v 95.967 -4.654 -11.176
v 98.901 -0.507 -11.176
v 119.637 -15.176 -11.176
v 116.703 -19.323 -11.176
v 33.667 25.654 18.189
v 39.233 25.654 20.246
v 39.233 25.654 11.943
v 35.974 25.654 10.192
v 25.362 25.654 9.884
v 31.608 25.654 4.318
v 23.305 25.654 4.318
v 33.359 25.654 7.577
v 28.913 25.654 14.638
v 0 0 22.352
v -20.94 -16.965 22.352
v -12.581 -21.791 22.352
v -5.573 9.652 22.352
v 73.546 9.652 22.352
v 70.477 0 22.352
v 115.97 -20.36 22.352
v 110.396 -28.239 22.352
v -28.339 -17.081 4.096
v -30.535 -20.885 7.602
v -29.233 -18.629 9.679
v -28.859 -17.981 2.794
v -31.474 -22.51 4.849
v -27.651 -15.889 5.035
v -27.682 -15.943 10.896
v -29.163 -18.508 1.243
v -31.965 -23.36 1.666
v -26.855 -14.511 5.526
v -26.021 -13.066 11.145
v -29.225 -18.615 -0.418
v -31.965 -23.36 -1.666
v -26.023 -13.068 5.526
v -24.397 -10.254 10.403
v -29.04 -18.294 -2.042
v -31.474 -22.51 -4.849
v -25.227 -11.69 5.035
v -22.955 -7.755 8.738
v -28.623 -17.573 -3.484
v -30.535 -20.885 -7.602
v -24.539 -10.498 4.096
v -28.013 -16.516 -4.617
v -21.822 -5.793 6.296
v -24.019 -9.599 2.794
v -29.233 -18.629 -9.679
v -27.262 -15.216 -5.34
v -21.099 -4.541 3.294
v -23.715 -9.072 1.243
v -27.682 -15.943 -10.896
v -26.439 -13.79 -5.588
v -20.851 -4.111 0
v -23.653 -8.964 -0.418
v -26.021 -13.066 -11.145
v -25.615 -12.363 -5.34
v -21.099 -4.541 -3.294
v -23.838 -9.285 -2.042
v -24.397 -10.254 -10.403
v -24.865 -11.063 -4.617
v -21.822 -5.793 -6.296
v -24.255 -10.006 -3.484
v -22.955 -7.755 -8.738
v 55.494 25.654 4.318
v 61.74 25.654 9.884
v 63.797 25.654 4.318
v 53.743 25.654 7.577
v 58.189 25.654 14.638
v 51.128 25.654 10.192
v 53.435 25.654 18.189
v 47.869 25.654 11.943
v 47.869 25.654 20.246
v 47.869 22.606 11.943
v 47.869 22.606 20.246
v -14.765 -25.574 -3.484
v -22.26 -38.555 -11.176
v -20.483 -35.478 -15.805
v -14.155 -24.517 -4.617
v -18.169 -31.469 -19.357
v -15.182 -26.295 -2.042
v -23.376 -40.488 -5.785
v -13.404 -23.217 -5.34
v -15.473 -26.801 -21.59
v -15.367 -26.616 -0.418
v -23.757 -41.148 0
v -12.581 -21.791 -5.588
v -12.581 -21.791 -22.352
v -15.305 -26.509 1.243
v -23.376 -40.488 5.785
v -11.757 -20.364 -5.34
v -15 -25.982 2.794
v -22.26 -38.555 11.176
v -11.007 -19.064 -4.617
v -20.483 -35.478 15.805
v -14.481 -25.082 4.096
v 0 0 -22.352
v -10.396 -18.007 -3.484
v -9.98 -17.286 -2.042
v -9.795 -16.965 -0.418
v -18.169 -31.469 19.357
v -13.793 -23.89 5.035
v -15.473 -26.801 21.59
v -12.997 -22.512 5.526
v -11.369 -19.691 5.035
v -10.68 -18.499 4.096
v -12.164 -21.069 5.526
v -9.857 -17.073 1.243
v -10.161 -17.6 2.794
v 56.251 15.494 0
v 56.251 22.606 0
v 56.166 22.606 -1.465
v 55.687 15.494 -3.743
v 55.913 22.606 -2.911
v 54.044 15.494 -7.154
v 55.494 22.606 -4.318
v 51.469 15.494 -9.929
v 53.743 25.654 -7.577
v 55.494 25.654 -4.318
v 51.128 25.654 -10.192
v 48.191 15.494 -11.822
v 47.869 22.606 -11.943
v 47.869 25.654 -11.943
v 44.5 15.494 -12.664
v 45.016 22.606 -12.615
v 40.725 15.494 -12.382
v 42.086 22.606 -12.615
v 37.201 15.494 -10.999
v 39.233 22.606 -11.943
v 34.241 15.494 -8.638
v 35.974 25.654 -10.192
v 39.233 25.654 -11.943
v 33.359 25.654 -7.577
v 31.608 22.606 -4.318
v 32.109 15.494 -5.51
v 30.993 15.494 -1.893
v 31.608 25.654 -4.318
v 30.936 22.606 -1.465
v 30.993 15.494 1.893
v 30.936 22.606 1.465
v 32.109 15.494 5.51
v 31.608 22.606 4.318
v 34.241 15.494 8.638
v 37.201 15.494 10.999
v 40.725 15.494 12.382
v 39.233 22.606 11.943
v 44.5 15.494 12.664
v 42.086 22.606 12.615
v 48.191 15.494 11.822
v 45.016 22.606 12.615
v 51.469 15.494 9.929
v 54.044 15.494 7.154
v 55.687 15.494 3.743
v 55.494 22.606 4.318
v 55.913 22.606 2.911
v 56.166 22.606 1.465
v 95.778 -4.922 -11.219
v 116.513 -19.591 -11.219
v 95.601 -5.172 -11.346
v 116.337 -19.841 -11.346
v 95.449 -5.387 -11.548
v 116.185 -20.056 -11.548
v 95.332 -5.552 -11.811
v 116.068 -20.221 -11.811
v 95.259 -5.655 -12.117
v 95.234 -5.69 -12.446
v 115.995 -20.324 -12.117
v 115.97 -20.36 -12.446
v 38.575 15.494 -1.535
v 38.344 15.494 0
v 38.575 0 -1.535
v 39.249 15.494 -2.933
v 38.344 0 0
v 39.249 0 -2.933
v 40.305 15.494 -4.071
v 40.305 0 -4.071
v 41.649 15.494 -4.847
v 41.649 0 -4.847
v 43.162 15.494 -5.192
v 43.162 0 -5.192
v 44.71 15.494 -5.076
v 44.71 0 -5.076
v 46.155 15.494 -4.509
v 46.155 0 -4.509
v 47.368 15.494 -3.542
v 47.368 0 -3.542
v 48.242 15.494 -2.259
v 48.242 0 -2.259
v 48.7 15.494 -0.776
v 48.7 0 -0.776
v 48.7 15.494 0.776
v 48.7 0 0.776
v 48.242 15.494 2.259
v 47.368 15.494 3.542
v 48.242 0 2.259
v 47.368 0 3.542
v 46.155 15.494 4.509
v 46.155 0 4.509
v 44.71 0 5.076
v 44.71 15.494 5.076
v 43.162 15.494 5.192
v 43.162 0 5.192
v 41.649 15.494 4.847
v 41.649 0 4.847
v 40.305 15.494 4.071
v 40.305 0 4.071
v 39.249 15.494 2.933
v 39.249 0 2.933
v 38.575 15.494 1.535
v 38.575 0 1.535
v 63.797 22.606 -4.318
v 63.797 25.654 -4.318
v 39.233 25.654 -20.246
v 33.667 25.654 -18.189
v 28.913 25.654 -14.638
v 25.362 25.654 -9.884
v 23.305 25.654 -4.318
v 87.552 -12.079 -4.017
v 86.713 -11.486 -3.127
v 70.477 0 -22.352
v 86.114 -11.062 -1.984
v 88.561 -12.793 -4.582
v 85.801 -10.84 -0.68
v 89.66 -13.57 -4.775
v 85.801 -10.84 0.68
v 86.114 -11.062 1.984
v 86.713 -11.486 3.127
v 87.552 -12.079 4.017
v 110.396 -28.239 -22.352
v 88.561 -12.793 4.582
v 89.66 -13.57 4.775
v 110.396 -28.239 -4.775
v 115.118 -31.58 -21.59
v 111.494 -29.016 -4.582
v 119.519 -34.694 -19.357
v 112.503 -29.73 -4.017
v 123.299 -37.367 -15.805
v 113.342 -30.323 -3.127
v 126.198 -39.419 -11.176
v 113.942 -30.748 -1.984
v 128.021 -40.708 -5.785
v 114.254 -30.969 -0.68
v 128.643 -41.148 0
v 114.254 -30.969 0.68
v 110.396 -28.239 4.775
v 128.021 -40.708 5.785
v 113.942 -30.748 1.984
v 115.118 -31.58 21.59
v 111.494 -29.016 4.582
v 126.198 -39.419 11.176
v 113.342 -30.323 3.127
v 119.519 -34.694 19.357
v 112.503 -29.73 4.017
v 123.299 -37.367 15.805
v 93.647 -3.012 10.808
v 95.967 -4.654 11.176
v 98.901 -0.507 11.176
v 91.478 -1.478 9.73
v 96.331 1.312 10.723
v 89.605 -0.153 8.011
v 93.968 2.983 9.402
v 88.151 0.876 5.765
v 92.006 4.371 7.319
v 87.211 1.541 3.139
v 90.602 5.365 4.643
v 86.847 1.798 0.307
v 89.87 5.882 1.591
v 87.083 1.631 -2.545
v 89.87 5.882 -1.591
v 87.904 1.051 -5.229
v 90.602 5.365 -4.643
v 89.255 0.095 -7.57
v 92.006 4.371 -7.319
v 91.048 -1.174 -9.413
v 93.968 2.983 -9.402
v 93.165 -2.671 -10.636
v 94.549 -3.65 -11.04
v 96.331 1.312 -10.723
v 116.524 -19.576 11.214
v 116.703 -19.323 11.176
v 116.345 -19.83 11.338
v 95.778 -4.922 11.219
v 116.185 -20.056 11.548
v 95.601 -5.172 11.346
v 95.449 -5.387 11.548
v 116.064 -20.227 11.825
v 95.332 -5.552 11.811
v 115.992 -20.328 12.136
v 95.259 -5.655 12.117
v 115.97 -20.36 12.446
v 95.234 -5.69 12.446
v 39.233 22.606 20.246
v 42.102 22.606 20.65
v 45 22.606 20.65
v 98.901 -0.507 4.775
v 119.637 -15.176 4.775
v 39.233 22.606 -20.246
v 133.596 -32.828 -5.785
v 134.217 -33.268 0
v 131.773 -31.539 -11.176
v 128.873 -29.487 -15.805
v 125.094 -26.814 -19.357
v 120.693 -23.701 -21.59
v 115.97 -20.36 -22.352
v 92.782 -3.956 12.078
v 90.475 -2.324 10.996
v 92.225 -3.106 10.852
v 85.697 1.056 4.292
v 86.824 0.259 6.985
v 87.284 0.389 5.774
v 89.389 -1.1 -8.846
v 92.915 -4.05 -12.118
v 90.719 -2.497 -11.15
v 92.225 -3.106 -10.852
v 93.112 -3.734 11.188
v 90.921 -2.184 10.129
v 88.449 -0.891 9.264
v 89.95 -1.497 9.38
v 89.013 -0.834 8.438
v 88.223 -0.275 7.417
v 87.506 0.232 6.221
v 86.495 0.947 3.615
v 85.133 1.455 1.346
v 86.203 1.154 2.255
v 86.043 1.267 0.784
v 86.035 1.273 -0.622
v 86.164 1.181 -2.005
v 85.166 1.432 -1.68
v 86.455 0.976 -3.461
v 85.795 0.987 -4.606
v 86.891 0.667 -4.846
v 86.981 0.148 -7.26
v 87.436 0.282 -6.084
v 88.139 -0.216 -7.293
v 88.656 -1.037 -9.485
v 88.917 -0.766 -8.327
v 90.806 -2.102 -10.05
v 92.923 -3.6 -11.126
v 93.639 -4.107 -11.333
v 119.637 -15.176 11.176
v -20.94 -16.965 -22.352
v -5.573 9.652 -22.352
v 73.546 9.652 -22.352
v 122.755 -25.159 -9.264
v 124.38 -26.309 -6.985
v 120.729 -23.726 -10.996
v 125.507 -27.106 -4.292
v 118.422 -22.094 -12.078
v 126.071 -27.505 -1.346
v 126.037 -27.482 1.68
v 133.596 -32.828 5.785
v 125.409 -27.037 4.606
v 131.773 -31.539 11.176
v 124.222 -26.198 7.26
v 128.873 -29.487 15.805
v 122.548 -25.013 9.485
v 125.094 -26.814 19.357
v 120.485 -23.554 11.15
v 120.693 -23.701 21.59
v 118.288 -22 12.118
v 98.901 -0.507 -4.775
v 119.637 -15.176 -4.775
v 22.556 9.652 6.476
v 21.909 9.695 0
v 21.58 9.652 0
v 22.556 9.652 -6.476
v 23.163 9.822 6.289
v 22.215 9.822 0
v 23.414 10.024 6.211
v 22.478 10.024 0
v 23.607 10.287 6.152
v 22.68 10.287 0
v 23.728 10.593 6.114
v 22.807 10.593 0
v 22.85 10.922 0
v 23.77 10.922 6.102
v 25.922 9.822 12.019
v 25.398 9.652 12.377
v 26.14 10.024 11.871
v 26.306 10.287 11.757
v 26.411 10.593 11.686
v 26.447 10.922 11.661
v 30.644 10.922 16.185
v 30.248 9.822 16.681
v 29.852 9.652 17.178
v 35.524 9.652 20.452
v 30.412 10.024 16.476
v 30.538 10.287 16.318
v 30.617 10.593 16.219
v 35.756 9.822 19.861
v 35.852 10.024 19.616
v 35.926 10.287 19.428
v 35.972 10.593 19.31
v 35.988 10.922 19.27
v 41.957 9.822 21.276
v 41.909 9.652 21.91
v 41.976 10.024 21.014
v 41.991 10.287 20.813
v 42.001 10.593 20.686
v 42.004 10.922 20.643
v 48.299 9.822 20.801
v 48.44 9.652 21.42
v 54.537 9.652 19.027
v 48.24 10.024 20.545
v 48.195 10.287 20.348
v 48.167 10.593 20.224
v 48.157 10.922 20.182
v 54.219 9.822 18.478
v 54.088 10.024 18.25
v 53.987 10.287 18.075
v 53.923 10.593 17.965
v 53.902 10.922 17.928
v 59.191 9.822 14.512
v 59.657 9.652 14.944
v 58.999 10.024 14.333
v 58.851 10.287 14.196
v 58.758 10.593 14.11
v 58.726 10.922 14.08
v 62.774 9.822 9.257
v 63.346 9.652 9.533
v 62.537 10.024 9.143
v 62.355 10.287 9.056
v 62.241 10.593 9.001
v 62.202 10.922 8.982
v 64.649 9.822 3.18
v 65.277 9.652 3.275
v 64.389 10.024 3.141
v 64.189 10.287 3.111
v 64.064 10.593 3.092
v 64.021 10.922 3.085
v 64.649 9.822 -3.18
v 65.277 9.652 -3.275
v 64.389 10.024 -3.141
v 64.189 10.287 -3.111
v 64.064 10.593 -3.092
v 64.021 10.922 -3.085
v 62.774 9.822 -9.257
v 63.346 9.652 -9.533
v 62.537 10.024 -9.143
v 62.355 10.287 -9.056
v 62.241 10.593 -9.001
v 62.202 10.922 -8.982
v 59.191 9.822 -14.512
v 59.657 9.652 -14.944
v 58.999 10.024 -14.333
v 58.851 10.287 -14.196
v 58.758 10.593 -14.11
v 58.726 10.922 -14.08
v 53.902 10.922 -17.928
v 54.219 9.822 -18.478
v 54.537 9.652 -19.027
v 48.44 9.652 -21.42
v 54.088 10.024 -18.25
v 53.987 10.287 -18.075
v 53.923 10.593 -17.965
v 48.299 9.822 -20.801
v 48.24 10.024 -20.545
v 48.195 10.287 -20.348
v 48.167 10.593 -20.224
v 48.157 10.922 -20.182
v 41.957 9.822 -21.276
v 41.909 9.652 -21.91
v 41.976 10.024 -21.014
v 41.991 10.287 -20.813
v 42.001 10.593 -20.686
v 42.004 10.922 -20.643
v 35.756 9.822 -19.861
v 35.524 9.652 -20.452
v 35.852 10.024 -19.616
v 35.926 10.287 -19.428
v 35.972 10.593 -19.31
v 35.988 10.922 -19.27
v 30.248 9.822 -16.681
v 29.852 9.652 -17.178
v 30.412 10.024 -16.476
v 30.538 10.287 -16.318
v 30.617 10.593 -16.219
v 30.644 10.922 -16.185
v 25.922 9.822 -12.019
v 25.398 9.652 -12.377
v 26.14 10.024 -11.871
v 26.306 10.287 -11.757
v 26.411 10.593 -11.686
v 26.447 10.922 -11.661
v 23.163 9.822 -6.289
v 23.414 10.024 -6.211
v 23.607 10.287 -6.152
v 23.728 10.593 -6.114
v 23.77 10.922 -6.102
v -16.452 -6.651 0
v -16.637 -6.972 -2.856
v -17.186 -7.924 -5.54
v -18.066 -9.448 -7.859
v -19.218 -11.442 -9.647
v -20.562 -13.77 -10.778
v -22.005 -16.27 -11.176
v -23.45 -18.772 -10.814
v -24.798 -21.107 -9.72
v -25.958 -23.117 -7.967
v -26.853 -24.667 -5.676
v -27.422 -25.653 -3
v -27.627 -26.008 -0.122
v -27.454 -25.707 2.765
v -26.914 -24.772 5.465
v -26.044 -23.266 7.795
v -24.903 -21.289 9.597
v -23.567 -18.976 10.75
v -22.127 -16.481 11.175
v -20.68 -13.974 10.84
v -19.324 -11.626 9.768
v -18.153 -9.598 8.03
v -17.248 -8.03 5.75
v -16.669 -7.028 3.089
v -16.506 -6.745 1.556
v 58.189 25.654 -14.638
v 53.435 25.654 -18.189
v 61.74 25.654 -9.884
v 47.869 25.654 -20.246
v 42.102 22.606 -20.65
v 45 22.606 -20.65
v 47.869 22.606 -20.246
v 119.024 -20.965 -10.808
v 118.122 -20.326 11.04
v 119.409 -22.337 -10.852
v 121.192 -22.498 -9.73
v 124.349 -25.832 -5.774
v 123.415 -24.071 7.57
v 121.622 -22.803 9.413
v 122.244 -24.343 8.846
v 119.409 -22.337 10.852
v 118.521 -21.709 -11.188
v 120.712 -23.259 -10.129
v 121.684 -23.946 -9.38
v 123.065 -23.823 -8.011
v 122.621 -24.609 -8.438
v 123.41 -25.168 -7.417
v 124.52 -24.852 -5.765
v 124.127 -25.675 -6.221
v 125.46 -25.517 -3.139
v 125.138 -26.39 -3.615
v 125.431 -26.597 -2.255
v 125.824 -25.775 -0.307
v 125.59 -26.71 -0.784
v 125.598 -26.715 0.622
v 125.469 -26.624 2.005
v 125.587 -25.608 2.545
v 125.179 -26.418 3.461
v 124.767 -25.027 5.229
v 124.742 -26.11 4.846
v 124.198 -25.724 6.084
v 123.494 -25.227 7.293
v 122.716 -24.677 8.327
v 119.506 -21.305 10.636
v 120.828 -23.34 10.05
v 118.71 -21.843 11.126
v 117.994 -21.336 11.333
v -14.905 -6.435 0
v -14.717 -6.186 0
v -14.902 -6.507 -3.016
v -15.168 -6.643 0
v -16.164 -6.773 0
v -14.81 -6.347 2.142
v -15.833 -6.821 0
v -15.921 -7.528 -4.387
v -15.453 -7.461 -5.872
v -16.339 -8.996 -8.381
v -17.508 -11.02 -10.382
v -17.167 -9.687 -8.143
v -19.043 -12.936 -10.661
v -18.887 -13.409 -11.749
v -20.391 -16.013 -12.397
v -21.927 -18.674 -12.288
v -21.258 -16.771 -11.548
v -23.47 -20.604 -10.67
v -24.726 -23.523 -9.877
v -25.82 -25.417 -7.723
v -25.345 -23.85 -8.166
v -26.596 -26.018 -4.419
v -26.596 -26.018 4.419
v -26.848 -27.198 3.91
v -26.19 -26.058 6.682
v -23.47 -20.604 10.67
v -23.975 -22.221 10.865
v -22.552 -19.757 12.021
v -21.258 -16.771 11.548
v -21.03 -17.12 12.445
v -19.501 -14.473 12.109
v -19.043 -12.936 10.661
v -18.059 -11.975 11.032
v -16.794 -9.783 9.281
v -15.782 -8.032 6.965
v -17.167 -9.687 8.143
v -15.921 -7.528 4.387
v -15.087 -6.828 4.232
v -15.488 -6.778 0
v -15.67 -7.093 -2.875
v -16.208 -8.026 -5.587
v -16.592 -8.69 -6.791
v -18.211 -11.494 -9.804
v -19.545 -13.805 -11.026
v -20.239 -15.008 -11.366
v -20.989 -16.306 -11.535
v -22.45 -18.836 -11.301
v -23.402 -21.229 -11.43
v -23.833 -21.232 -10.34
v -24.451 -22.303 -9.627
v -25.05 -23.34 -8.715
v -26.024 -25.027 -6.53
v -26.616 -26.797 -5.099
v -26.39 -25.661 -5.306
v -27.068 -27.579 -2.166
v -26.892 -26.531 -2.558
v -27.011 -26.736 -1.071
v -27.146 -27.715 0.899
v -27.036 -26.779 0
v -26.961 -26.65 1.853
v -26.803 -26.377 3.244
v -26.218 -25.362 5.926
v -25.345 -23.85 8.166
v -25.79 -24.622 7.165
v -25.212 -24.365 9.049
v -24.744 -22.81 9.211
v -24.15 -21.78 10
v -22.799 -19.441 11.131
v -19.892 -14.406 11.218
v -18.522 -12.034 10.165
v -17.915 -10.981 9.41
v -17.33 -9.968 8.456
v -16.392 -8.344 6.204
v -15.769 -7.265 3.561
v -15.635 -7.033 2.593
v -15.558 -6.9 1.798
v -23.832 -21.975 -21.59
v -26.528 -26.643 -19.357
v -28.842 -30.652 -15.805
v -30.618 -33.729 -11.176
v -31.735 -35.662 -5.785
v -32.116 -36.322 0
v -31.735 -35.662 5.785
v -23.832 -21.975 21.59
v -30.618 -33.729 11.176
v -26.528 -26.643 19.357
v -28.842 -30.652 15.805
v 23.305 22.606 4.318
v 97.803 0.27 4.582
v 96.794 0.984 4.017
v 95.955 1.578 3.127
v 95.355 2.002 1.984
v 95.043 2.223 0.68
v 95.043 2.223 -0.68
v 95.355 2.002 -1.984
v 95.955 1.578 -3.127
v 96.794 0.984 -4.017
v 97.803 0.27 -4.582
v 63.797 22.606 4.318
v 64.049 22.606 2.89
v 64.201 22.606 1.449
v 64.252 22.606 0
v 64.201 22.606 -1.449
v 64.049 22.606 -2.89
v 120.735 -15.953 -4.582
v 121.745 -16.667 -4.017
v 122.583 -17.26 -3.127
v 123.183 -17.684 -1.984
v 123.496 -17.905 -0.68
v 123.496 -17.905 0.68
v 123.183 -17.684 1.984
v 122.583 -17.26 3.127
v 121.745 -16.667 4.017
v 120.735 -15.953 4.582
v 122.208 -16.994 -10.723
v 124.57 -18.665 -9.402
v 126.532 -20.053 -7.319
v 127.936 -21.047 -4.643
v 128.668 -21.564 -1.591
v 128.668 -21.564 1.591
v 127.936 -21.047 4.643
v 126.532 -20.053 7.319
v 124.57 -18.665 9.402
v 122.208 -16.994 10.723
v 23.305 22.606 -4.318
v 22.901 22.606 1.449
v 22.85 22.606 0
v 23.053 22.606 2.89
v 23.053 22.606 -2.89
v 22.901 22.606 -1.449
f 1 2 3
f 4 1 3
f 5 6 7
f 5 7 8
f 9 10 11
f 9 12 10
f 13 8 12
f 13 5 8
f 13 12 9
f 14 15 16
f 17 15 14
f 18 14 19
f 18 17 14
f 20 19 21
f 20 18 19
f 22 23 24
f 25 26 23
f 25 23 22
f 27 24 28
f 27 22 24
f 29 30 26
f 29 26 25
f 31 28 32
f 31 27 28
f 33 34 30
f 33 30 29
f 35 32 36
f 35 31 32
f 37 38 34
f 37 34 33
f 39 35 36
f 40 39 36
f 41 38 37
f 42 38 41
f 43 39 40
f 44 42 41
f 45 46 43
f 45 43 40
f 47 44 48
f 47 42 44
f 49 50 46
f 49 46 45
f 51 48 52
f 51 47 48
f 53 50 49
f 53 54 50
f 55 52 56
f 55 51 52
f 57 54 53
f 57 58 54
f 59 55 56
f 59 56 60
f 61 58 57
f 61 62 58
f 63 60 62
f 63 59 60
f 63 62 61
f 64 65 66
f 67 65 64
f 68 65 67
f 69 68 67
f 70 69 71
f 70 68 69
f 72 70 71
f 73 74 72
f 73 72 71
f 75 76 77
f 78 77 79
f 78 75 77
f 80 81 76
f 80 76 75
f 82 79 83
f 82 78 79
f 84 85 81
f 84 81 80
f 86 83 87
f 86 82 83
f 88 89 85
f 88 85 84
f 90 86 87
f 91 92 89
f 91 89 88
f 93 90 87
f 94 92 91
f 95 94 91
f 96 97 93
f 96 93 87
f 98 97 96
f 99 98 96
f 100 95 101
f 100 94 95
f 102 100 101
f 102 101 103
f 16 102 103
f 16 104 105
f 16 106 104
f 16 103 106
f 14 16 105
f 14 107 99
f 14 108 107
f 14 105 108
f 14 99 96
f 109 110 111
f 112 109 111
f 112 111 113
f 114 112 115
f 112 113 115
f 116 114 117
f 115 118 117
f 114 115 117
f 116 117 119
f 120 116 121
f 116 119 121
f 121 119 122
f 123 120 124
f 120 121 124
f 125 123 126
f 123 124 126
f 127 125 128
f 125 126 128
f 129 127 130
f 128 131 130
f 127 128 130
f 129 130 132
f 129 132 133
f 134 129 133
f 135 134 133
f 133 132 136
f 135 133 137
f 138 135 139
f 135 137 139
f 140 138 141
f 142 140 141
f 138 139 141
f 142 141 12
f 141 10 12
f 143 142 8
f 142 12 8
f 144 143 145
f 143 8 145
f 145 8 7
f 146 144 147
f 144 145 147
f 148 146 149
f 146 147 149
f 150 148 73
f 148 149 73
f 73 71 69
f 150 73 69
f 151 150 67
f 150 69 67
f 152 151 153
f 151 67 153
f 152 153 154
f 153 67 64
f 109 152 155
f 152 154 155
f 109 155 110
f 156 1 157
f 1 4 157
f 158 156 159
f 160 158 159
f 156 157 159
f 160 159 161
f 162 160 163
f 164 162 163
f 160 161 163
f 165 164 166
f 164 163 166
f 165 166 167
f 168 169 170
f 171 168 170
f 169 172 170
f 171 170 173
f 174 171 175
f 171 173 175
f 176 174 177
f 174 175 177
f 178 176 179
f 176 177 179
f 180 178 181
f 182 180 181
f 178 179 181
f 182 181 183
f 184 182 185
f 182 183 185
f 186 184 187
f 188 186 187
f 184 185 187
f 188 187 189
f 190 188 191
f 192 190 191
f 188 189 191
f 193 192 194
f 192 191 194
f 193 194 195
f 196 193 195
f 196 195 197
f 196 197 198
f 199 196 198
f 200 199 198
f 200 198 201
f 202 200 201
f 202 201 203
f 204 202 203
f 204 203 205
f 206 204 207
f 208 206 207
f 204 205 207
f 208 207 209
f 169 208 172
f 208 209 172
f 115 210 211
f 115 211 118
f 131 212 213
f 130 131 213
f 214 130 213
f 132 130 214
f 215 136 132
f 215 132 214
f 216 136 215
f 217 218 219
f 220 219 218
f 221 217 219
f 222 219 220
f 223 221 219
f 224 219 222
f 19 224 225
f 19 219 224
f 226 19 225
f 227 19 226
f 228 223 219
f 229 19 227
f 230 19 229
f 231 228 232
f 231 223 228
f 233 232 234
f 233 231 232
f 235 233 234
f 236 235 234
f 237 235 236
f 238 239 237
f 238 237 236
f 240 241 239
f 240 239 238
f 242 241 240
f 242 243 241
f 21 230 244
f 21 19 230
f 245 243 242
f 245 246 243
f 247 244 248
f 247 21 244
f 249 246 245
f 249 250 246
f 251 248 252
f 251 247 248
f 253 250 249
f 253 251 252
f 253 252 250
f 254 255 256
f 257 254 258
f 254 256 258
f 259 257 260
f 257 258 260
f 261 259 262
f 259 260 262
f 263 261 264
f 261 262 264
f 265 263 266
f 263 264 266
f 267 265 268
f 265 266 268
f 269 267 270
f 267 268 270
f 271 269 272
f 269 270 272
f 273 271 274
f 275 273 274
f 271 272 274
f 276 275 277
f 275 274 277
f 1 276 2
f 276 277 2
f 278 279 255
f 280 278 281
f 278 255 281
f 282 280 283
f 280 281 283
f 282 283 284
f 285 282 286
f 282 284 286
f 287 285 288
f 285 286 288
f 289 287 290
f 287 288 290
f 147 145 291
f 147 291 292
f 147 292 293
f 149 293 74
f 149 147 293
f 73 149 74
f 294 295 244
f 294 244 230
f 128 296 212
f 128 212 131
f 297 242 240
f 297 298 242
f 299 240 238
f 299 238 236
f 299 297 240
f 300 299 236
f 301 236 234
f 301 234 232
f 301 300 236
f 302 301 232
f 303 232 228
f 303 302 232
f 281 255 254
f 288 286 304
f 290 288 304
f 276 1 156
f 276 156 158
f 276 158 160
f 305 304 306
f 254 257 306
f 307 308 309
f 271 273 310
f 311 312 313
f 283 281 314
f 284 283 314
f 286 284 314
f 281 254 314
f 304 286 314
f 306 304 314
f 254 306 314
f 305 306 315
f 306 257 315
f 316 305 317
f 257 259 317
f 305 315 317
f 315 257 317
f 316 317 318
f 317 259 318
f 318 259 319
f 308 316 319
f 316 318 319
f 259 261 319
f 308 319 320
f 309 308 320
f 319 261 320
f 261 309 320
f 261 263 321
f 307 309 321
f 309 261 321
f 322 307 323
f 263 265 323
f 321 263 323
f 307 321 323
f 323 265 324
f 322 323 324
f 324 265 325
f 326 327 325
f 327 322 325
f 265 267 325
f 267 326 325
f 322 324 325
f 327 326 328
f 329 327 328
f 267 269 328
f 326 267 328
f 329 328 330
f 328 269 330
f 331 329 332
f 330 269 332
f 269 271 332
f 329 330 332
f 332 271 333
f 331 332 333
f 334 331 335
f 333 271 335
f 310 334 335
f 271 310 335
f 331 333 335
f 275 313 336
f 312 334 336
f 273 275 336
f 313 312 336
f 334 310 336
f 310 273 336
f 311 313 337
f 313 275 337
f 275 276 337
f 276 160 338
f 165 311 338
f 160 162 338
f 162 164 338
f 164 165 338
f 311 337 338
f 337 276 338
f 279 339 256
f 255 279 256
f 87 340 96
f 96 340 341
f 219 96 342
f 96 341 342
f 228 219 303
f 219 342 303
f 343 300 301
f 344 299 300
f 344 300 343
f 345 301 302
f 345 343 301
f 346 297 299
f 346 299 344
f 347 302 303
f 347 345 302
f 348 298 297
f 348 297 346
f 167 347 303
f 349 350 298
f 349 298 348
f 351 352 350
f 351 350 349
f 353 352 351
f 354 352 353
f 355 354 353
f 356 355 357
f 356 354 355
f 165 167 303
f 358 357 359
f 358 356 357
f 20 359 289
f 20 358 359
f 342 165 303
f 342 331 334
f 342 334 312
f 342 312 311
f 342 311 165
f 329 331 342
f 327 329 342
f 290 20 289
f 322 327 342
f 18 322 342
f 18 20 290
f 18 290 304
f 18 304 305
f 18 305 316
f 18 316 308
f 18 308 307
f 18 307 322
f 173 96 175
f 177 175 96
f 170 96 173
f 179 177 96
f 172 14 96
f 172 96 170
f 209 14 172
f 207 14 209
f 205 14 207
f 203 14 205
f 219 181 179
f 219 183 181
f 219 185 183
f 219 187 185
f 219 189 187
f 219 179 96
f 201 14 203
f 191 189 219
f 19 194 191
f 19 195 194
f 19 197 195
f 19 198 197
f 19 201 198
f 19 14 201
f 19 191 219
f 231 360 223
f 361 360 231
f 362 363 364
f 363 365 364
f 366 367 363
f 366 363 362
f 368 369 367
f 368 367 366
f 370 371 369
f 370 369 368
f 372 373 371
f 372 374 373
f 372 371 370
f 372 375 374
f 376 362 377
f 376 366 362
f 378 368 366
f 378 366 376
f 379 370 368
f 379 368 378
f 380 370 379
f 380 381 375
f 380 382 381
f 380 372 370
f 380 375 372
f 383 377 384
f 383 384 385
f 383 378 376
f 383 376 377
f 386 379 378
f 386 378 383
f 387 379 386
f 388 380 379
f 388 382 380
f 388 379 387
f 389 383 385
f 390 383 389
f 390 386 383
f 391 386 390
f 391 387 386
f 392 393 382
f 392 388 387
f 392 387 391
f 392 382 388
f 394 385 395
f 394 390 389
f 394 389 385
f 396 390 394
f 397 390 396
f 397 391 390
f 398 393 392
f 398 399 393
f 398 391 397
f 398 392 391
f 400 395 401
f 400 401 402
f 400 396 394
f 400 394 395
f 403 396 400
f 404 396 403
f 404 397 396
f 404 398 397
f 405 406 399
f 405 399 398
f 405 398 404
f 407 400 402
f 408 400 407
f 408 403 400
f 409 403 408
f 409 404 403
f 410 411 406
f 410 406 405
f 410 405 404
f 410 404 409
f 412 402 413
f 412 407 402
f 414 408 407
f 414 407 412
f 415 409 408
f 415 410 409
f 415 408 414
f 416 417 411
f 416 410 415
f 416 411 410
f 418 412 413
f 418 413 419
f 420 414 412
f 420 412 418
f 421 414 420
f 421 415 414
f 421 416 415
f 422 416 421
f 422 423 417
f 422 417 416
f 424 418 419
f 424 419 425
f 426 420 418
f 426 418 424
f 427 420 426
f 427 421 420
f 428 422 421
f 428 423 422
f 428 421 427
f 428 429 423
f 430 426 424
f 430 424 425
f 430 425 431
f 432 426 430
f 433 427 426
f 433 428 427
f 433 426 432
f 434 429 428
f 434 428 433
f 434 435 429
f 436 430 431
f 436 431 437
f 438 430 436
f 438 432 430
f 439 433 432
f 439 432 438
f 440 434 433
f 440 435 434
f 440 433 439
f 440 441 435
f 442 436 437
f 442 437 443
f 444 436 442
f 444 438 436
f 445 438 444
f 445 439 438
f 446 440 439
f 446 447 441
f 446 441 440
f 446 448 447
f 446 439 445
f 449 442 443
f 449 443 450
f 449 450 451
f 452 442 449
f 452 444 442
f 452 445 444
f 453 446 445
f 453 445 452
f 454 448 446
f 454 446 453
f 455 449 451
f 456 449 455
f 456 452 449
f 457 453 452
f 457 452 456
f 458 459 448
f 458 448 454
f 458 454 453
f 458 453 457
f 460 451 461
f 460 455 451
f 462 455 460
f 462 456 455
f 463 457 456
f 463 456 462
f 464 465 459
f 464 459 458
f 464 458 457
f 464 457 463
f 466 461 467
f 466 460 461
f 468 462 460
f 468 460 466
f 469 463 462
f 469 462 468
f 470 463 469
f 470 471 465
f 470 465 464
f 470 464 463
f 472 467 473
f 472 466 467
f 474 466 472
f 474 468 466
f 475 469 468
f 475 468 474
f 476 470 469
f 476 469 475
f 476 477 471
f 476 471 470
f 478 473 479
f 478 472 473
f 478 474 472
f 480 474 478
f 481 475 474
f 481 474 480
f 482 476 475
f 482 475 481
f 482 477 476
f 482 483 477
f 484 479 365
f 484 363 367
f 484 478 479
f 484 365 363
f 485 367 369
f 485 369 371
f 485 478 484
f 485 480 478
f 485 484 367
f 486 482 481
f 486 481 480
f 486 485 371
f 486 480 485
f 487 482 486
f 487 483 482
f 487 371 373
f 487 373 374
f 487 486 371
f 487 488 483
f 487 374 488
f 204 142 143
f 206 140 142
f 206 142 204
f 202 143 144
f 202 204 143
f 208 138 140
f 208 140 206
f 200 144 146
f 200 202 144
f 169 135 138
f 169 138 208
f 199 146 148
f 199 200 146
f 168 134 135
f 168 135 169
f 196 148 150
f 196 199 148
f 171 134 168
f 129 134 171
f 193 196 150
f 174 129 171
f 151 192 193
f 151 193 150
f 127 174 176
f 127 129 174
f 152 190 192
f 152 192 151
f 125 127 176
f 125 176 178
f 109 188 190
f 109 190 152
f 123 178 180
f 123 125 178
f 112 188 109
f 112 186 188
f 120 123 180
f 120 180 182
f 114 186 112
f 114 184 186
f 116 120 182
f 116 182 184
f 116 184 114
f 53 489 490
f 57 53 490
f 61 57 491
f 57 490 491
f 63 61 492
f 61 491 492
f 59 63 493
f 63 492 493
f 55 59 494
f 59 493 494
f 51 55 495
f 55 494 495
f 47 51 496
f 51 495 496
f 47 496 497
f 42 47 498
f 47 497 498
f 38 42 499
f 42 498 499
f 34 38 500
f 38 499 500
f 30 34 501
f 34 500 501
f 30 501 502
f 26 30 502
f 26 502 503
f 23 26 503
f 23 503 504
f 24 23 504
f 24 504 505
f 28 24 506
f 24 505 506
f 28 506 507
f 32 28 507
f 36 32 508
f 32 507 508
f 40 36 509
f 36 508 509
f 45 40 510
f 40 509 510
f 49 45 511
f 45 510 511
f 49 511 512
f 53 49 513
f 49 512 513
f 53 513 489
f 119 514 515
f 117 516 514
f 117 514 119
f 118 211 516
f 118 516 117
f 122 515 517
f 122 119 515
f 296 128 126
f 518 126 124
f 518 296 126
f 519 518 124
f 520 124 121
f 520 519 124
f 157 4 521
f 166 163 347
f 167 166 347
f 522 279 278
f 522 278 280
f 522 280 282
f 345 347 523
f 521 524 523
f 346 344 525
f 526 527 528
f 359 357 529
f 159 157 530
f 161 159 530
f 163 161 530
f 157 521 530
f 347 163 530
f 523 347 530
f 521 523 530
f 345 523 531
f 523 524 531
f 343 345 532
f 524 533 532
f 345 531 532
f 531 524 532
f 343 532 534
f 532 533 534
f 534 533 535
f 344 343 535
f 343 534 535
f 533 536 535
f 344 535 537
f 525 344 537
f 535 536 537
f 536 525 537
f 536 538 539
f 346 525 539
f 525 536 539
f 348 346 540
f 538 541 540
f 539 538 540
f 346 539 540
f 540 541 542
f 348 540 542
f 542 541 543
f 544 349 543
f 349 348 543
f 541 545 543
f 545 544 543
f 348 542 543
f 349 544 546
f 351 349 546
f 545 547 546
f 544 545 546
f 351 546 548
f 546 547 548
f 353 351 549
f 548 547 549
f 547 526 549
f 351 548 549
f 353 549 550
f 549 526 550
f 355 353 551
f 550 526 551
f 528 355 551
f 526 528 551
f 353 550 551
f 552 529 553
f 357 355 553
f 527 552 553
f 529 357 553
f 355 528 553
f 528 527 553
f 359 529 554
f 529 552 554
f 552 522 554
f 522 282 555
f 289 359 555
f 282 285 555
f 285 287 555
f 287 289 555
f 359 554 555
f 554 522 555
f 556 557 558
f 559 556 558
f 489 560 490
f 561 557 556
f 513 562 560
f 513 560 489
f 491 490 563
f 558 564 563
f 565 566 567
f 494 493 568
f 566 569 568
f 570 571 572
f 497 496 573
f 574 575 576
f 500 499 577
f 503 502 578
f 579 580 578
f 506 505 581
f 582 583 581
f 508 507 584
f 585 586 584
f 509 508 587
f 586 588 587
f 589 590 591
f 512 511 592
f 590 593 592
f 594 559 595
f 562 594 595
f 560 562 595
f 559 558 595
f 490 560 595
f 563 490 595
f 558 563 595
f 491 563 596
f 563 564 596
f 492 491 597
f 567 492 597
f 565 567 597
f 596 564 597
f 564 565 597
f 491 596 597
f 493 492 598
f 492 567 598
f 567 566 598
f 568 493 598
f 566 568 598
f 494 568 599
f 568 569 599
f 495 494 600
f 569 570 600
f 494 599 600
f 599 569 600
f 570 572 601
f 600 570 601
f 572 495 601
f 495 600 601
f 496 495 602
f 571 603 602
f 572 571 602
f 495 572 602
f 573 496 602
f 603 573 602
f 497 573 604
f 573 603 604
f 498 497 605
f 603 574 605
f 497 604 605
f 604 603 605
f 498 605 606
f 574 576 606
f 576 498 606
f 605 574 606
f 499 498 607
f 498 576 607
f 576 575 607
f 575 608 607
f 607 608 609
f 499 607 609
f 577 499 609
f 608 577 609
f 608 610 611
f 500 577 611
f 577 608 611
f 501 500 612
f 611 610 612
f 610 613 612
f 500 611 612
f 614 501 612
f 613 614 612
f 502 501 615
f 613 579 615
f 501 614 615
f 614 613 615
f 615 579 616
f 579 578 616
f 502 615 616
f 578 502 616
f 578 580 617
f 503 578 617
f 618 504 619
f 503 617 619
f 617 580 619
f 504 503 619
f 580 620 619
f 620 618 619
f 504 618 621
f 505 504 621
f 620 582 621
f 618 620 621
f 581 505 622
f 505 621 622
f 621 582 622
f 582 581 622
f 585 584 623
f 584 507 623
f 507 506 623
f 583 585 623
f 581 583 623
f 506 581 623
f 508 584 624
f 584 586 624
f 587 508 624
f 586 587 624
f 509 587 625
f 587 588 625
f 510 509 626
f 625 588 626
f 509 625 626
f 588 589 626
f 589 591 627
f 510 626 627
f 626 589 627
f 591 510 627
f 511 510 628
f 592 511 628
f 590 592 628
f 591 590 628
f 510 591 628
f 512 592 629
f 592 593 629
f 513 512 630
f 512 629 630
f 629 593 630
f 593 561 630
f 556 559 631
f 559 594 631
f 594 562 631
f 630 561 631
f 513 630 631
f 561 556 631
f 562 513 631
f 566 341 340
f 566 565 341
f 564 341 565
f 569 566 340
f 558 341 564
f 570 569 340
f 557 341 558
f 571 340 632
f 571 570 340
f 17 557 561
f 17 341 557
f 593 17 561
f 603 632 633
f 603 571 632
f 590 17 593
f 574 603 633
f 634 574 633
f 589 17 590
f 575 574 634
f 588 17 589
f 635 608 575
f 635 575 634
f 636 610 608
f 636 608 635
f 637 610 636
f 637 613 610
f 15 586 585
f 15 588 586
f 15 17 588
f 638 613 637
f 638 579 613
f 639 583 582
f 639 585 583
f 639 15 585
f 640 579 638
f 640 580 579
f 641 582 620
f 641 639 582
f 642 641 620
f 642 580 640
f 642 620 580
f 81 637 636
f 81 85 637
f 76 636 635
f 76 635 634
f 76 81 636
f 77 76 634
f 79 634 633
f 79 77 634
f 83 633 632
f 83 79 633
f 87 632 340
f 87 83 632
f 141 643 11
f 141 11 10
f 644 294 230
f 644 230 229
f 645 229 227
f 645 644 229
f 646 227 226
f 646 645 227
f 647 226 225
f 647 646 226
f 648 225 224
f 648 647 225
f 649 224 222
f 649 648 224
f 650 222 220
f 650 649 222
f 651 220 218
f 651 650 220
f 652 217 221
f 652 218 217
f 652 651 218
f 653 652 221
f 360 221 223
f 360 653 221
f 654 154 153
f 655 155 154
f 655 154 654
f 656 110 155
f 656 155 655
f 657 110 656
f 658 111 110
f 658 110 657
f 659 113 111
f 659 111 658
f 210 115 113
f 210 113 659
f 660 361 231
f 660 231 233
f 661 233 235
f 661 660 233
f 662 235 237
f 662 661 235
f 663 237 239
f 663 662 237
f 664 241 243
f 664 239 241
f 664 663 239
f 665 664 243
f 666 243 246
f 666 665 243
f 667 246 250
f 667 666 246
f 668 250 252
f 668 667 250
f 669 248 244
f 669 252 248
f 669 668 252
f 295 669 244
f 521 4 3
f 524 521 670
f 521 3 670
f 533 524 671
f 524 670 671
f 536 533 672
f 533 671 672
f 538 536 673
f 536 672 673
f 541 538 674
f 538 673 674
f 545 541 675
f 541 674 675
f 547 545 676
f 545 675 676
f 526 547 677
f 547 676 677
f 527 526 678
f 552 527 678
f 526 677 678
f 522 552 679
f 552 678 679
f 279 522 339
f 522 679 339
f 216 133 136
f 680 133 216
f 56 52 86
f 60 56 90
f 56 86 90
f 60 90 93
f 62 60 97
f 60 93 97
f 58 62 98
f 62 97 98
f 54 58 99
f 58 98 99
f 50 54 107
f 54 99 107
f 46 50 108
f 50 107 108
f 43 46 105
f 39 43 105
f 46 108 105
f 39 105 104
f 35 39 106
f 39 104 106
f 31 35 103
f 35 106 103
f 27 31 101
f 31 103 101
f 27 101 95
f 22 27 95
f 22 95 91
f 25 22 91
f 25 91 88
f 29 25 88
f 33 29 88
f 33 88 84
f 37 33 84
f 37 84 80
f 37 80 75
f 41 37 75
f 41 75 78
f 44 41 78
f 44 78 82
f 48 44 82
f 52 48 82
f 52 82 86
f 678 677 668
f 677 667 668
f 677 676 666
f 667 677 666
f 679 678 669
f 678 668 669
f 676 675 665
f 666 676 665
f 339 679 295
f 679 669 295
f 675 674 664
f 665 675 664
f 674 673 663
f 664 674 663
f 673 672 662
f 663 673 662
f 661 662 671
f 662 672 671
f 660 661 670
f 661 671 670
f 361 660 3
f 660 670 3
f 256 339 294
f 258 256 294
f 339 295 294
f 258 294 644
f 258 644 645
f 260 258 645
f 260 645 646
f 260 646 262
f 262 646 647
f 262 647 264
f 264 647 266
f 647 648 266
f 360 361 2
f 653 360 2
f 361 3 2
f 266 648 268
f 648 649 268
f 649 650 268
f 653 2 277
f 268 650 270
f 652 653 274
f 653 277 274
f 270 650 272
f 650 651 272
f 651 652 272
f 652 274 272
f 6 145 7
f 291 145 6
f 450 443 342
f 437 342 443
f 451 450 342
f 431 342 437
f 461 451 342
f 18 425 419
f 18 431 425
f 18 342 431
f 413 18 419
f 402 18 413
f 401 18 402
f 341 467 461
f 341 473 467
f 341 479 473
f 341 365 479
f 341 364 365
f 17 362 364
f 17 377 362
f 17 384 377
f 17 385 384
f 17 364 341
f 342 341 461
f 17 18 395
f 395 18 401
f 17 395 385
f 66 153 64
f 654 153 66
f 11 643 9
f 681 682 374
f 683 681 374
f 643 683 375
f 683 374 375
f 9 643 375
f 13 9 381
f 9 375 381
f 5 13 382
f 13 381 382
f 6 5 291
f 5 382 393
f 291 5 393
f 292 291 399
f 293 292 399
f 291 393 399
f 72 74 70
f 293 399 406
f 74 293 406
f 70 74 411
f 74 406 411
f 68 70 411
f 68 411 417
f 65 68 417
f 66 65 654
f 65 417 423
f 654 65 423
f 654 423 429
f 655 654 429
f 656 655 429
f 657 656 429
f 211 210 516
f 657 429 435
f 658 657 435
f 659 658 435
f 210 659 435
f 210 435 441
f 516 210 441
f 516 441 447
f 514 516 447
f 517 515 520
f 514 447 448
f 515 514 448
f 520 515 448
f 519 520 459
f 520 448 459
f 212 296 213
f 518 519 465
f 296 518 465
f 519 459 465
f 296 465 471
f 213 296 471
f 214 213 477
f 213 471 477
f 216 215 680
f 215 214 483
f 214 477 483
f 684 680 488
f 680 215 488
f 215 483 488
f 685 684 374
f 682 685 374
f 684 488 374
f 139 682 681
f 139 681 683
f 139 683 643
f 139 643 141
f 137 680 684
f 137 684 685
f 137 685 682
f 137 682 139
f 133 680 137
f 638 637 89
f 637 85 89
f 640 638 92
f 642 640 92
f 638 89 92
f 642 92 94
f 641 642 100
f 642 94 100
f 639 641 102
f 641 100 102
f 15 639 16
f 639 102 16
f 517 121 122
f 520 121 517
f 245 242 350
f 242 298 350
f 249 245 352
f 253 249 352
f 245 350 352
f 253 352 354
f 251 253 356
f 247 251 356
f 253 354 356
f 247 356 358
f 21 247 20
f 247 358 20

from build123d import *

# Parameters (mm, degrees)
BOSS_EXTRUDE1_DEPTH                                  = 22.352
FILLET1_R                                            = 22.352
CUT_EXTRUDE1_DEPTH                                   = 136.349100872
BOSS_EXTRUDE2_START                                  = 6.35
BOSS_EXTRUDE2_DEPTH                                  = 6.35
SKETCH4_R                                            = 11.176
BOSS_EXTRUDE3_DEPTH                                  = 6.35
F_3_8_0_44_DIAMETER_HOLE1_D                          = 11.176
SKETCH7_R                                            = 20.701
BOSS_EXTRUDE4_DEPTH                                  = 16.002
CUT_EXTRUDE2_START                                   = -3.048
SKETCH8_W                                            = 8.636
SKETCH8_H                                            = 8.636
CUT_EXTRUDE2_DEPTH                                   = 3.048
CBORE_FOR_3_8_BINDING_HEAD_MACHINE_SCREW_D           = 10.414
CBORE_FOR_3_8_BINDING_HEAD_MACHINE_SCREW_CBORE_D     = 25.4
CBORE_FOR_3_8_BINDING_HEAD_MACHINE_SCREW_CBORE_DEPTH = 10.16
FILLET2_R                                            = 1.27


with BuildPart() as part:
    # Sketch1 → Boss-Extrude1 (new, symmetric)
    with BuildSketch(Plane.XY):
        Polygon((-23.756808877, -41.148), (0, 0), (70.477191123, 0), (128.643191123, -41.148), (134.217439977, -33.268351929), (73.546078299, 9.652), (-5.572584798, 9.652), (-32.115686074, -36.322), align=None)
    extrude(amount=BOSS_EXTRUDE1_DEPTH, both=True)

    # Fillet1
    fillet1_edges = [part.edges().sort_by_distance(p)[0] for p in [
        (-27.936247475, -38.735, 22.352),
        (-27.936247475, -38.735, -22.352),
        (131.43031555, -37.208175965, -22.352),
        (131.43031555, -37.208175965, 22.352),
    ]]
    fillet(fillet1_edges, radius=FILLET1_R - 0.0001)  # a hair under: the kernel refuses the full size

    # Sketch2 → Cut-Extrude1 (cut, through all)
    with BuildSketch(Plane(origin=(29.080678336, 41.107872463, 0), x_dir=(0.8163746447104718, -0.5775226744240014, 0), z_dir=(0.5775226744240014, 0.8163746447104718, 0))):
        with BuildLine():
            Line((106.432942455, -4.7752), (81.032942455, -4.7752))
            ThreePointArc((81.032942455, -4.7752), (76.257742455, 0), (81.032942455, 4.7752))
            Line((81.032942455, 4.7752), (106.432942455, 4.7752))
            ThreePointArc((106.432942455, 4.7752), (111.208142455, 0), (106.432942455, -4.7752))
        make_face()
    extrude(amount=-CUT_EXTRUDE1_DEPTH, mode=Mode.SUBTRACT)

    # Sketch3 → Boss-Extrude2 (add)
    with BuildSketch(Plane(origin=(29.080678336, 41.107872463, 0), x_dir=(0.8163746447104718, -0.5775226744240014, 0), z_dir=(0.5775226744240014, 0.8163746447104718, 0)).offset(BOSS_EXTRUDE2_START)):
        with BuildLine():
            Line((81.032942455, 11.176), (106.432942455, 11.176))
            ThreePointArc((106.432942455, 11.176), (117.608942455, 0), (106.432942455, -11.176))
            Line((106.432942455, -11.176), (81.032942455, -11.176))
            ThreePointArc((81.032942455, -11.176), (69.856942455, 0), (81.032942455, 11.176))
        make_face()
        with BuildLine():
            Line((81.032942455, 4.7752), (106.432942455, 4.7752))
            ThreePointArc((106.432942455, 4.7752), (111.208142455, 0), (106.432942455, -4.7752))
            Line((106.432942455, -4.7752), (81.032942455, -4.7752))
            ThreePointArc((81.032942455, -4.7752), (76.257742455, 0), (81.032942455, 4.7752))
        make_face(mode=Mode.SUBTRACT)
    extrude(amount=-BOSS_EXTRUDE2_DEPTH)

    # Sketch4 → Boss-Extrude3 (add)
    with BuildSketch(Plane(origin=(-8.358877197, 4.826, 0), x_dir=(0, 0, 1), z_dir=(-0.8660254037844402, 0.4999999999999977, 0))):
        with Locations(Location((0, -25.161617753, 0), (0, 0, 90))):
            Circle(SKETCH4_R)
    extrude(amount=BOSS_EXTRUDE3_DEPTH)

    # 3/8 (0.44) Diameter Hole1 (through all)
    with Locations(Plane(origin=(-13.858138511, 8.001, 0), x_dir=(0, 0, 1), z_dir=(-0.86602540378444, 0.49999999999999784, 0))):
        with Locations((0, -25.161617753)):
            Hole(F_3_8_0_44_DIAMETER_HOLE1_D / 2)

    # Sketch7 → Boss-Extrude4 (add)
    with BuildSketch(Plane(origin=(0, 9.652, 0), x_dir=(1, 0, 0), z_dir=(0, 1, 0))):
        with Locations(Location((43.551015202, 0, 0), (0, 0, 180))):
            Circle(SKETCH7_R)
    extrude(amount=BOSS_EXTRUDE4_DEPTH)

    # Sketch8 → Cut-Extrude2 (cut)
    with BuildSketch(Plane(origin=(0, 25.654, 0), x_dir=(1, 0, 0), z_dir=(0, 1, 0)).offset(CUT_EXTRUDE2_START)):
        with BuildLine():
            Line((39.233015202, 20.245648347), (39.233015202, 4.318))
            Line((39.233015202, 4.318), (47.869015202, 4.318))
            Line((47.869015202, 4.318), (47.869015202, 20.245648347))
            ThreePointArc((47.869015202, 20.245648347), (43.551015202, 20.701), (39.233015202, 20.245648347))
        make_face()
        with Locations((43.551015202, 0)):
            Rectangle(SKETCH8_W, SKETCH8_H)
        with BuildLine():
            Line((63.796663549, 4.318), (47.869015202, 4.318))
            Line((47.869015202, 4.318), (47.869015202, -4.318))
            Line((47.869015202, -4.318), (63.796663549, -4.318))
            ThreePointArc((63.796663549, -4.318), (64.137862549, -2.170971506), (64.252015202, 0))
            ThreePointArc((64.252015202, 0), (64.137862549, 2.170971506), (63.796663549, 4.318))
        make_face()
        with BuildLine():
            Line((47.869015202, -4.318), (39.233015202, -4.318))
            Line((39.233015202, -4.318), (39.233015202, -20.245648347))
            ThreePointArc((39.233015202, -20.245648347), (43.551015202, -20.701), (47.869015202, -20.245648347))
            Line((47.869015202, -20.245648347), (47.869015202, -4.318))
        make_face()
        with BuildLine():
            Line((39.233015202, 4.318), (23.305366855, 4.318))
            ThreePointArc((23.305366855, 4.318), (22.850015202, 0), (23.305366855, -4.318))
            Line((23.305366855, -4.318), (39.233015202, -4.318))
            Line((39.233015202, -4.318), (39.233015202, 4.318))
        make_face()
    extrude(amount=CUT_EXTRUDE2_DEPTH, mode=Mode.SUBTRACT)

    # CBORE for 3/8 Binding Head Machine Screw1 (through all)
    with Locations(Plane(origin=(0, 25.654, 0), x_dir=(1, 0, 0), z_dir=(0, 1, 0))):
        with Locations((43.551015202, 0)):
            CounterBoreHole(CBORE_FOR_3_8_BINDING_HEAD_MACHINE_SCREW_D / 2, CBORE_FOR_3_8_BINDING_HEAD_MACHINE_SCREW_CBORE_D / 2, CBORE_FOR_3_8_BINDING_HEAD_MACHINE_SCREW_CBORE_DEPTH)

    # Fillet2
    fillet2_edges = [part.edges().sort_by_distance(p)[0] for p in [
        (86.110114913, 0.763904229, 0),
        (105.601875931, -13.025027145, 11.176),
        (125.093636948, -26.81395852, 0),
        (105.601875931, -13.025027145, -11.176),
        (-26.527686074, -26.643300087, 0),
        (64.252015202, 9.652, 0),
    ]]
    fillet(fillet2_edges, radius=FILLET2_R)


solid = part.part
